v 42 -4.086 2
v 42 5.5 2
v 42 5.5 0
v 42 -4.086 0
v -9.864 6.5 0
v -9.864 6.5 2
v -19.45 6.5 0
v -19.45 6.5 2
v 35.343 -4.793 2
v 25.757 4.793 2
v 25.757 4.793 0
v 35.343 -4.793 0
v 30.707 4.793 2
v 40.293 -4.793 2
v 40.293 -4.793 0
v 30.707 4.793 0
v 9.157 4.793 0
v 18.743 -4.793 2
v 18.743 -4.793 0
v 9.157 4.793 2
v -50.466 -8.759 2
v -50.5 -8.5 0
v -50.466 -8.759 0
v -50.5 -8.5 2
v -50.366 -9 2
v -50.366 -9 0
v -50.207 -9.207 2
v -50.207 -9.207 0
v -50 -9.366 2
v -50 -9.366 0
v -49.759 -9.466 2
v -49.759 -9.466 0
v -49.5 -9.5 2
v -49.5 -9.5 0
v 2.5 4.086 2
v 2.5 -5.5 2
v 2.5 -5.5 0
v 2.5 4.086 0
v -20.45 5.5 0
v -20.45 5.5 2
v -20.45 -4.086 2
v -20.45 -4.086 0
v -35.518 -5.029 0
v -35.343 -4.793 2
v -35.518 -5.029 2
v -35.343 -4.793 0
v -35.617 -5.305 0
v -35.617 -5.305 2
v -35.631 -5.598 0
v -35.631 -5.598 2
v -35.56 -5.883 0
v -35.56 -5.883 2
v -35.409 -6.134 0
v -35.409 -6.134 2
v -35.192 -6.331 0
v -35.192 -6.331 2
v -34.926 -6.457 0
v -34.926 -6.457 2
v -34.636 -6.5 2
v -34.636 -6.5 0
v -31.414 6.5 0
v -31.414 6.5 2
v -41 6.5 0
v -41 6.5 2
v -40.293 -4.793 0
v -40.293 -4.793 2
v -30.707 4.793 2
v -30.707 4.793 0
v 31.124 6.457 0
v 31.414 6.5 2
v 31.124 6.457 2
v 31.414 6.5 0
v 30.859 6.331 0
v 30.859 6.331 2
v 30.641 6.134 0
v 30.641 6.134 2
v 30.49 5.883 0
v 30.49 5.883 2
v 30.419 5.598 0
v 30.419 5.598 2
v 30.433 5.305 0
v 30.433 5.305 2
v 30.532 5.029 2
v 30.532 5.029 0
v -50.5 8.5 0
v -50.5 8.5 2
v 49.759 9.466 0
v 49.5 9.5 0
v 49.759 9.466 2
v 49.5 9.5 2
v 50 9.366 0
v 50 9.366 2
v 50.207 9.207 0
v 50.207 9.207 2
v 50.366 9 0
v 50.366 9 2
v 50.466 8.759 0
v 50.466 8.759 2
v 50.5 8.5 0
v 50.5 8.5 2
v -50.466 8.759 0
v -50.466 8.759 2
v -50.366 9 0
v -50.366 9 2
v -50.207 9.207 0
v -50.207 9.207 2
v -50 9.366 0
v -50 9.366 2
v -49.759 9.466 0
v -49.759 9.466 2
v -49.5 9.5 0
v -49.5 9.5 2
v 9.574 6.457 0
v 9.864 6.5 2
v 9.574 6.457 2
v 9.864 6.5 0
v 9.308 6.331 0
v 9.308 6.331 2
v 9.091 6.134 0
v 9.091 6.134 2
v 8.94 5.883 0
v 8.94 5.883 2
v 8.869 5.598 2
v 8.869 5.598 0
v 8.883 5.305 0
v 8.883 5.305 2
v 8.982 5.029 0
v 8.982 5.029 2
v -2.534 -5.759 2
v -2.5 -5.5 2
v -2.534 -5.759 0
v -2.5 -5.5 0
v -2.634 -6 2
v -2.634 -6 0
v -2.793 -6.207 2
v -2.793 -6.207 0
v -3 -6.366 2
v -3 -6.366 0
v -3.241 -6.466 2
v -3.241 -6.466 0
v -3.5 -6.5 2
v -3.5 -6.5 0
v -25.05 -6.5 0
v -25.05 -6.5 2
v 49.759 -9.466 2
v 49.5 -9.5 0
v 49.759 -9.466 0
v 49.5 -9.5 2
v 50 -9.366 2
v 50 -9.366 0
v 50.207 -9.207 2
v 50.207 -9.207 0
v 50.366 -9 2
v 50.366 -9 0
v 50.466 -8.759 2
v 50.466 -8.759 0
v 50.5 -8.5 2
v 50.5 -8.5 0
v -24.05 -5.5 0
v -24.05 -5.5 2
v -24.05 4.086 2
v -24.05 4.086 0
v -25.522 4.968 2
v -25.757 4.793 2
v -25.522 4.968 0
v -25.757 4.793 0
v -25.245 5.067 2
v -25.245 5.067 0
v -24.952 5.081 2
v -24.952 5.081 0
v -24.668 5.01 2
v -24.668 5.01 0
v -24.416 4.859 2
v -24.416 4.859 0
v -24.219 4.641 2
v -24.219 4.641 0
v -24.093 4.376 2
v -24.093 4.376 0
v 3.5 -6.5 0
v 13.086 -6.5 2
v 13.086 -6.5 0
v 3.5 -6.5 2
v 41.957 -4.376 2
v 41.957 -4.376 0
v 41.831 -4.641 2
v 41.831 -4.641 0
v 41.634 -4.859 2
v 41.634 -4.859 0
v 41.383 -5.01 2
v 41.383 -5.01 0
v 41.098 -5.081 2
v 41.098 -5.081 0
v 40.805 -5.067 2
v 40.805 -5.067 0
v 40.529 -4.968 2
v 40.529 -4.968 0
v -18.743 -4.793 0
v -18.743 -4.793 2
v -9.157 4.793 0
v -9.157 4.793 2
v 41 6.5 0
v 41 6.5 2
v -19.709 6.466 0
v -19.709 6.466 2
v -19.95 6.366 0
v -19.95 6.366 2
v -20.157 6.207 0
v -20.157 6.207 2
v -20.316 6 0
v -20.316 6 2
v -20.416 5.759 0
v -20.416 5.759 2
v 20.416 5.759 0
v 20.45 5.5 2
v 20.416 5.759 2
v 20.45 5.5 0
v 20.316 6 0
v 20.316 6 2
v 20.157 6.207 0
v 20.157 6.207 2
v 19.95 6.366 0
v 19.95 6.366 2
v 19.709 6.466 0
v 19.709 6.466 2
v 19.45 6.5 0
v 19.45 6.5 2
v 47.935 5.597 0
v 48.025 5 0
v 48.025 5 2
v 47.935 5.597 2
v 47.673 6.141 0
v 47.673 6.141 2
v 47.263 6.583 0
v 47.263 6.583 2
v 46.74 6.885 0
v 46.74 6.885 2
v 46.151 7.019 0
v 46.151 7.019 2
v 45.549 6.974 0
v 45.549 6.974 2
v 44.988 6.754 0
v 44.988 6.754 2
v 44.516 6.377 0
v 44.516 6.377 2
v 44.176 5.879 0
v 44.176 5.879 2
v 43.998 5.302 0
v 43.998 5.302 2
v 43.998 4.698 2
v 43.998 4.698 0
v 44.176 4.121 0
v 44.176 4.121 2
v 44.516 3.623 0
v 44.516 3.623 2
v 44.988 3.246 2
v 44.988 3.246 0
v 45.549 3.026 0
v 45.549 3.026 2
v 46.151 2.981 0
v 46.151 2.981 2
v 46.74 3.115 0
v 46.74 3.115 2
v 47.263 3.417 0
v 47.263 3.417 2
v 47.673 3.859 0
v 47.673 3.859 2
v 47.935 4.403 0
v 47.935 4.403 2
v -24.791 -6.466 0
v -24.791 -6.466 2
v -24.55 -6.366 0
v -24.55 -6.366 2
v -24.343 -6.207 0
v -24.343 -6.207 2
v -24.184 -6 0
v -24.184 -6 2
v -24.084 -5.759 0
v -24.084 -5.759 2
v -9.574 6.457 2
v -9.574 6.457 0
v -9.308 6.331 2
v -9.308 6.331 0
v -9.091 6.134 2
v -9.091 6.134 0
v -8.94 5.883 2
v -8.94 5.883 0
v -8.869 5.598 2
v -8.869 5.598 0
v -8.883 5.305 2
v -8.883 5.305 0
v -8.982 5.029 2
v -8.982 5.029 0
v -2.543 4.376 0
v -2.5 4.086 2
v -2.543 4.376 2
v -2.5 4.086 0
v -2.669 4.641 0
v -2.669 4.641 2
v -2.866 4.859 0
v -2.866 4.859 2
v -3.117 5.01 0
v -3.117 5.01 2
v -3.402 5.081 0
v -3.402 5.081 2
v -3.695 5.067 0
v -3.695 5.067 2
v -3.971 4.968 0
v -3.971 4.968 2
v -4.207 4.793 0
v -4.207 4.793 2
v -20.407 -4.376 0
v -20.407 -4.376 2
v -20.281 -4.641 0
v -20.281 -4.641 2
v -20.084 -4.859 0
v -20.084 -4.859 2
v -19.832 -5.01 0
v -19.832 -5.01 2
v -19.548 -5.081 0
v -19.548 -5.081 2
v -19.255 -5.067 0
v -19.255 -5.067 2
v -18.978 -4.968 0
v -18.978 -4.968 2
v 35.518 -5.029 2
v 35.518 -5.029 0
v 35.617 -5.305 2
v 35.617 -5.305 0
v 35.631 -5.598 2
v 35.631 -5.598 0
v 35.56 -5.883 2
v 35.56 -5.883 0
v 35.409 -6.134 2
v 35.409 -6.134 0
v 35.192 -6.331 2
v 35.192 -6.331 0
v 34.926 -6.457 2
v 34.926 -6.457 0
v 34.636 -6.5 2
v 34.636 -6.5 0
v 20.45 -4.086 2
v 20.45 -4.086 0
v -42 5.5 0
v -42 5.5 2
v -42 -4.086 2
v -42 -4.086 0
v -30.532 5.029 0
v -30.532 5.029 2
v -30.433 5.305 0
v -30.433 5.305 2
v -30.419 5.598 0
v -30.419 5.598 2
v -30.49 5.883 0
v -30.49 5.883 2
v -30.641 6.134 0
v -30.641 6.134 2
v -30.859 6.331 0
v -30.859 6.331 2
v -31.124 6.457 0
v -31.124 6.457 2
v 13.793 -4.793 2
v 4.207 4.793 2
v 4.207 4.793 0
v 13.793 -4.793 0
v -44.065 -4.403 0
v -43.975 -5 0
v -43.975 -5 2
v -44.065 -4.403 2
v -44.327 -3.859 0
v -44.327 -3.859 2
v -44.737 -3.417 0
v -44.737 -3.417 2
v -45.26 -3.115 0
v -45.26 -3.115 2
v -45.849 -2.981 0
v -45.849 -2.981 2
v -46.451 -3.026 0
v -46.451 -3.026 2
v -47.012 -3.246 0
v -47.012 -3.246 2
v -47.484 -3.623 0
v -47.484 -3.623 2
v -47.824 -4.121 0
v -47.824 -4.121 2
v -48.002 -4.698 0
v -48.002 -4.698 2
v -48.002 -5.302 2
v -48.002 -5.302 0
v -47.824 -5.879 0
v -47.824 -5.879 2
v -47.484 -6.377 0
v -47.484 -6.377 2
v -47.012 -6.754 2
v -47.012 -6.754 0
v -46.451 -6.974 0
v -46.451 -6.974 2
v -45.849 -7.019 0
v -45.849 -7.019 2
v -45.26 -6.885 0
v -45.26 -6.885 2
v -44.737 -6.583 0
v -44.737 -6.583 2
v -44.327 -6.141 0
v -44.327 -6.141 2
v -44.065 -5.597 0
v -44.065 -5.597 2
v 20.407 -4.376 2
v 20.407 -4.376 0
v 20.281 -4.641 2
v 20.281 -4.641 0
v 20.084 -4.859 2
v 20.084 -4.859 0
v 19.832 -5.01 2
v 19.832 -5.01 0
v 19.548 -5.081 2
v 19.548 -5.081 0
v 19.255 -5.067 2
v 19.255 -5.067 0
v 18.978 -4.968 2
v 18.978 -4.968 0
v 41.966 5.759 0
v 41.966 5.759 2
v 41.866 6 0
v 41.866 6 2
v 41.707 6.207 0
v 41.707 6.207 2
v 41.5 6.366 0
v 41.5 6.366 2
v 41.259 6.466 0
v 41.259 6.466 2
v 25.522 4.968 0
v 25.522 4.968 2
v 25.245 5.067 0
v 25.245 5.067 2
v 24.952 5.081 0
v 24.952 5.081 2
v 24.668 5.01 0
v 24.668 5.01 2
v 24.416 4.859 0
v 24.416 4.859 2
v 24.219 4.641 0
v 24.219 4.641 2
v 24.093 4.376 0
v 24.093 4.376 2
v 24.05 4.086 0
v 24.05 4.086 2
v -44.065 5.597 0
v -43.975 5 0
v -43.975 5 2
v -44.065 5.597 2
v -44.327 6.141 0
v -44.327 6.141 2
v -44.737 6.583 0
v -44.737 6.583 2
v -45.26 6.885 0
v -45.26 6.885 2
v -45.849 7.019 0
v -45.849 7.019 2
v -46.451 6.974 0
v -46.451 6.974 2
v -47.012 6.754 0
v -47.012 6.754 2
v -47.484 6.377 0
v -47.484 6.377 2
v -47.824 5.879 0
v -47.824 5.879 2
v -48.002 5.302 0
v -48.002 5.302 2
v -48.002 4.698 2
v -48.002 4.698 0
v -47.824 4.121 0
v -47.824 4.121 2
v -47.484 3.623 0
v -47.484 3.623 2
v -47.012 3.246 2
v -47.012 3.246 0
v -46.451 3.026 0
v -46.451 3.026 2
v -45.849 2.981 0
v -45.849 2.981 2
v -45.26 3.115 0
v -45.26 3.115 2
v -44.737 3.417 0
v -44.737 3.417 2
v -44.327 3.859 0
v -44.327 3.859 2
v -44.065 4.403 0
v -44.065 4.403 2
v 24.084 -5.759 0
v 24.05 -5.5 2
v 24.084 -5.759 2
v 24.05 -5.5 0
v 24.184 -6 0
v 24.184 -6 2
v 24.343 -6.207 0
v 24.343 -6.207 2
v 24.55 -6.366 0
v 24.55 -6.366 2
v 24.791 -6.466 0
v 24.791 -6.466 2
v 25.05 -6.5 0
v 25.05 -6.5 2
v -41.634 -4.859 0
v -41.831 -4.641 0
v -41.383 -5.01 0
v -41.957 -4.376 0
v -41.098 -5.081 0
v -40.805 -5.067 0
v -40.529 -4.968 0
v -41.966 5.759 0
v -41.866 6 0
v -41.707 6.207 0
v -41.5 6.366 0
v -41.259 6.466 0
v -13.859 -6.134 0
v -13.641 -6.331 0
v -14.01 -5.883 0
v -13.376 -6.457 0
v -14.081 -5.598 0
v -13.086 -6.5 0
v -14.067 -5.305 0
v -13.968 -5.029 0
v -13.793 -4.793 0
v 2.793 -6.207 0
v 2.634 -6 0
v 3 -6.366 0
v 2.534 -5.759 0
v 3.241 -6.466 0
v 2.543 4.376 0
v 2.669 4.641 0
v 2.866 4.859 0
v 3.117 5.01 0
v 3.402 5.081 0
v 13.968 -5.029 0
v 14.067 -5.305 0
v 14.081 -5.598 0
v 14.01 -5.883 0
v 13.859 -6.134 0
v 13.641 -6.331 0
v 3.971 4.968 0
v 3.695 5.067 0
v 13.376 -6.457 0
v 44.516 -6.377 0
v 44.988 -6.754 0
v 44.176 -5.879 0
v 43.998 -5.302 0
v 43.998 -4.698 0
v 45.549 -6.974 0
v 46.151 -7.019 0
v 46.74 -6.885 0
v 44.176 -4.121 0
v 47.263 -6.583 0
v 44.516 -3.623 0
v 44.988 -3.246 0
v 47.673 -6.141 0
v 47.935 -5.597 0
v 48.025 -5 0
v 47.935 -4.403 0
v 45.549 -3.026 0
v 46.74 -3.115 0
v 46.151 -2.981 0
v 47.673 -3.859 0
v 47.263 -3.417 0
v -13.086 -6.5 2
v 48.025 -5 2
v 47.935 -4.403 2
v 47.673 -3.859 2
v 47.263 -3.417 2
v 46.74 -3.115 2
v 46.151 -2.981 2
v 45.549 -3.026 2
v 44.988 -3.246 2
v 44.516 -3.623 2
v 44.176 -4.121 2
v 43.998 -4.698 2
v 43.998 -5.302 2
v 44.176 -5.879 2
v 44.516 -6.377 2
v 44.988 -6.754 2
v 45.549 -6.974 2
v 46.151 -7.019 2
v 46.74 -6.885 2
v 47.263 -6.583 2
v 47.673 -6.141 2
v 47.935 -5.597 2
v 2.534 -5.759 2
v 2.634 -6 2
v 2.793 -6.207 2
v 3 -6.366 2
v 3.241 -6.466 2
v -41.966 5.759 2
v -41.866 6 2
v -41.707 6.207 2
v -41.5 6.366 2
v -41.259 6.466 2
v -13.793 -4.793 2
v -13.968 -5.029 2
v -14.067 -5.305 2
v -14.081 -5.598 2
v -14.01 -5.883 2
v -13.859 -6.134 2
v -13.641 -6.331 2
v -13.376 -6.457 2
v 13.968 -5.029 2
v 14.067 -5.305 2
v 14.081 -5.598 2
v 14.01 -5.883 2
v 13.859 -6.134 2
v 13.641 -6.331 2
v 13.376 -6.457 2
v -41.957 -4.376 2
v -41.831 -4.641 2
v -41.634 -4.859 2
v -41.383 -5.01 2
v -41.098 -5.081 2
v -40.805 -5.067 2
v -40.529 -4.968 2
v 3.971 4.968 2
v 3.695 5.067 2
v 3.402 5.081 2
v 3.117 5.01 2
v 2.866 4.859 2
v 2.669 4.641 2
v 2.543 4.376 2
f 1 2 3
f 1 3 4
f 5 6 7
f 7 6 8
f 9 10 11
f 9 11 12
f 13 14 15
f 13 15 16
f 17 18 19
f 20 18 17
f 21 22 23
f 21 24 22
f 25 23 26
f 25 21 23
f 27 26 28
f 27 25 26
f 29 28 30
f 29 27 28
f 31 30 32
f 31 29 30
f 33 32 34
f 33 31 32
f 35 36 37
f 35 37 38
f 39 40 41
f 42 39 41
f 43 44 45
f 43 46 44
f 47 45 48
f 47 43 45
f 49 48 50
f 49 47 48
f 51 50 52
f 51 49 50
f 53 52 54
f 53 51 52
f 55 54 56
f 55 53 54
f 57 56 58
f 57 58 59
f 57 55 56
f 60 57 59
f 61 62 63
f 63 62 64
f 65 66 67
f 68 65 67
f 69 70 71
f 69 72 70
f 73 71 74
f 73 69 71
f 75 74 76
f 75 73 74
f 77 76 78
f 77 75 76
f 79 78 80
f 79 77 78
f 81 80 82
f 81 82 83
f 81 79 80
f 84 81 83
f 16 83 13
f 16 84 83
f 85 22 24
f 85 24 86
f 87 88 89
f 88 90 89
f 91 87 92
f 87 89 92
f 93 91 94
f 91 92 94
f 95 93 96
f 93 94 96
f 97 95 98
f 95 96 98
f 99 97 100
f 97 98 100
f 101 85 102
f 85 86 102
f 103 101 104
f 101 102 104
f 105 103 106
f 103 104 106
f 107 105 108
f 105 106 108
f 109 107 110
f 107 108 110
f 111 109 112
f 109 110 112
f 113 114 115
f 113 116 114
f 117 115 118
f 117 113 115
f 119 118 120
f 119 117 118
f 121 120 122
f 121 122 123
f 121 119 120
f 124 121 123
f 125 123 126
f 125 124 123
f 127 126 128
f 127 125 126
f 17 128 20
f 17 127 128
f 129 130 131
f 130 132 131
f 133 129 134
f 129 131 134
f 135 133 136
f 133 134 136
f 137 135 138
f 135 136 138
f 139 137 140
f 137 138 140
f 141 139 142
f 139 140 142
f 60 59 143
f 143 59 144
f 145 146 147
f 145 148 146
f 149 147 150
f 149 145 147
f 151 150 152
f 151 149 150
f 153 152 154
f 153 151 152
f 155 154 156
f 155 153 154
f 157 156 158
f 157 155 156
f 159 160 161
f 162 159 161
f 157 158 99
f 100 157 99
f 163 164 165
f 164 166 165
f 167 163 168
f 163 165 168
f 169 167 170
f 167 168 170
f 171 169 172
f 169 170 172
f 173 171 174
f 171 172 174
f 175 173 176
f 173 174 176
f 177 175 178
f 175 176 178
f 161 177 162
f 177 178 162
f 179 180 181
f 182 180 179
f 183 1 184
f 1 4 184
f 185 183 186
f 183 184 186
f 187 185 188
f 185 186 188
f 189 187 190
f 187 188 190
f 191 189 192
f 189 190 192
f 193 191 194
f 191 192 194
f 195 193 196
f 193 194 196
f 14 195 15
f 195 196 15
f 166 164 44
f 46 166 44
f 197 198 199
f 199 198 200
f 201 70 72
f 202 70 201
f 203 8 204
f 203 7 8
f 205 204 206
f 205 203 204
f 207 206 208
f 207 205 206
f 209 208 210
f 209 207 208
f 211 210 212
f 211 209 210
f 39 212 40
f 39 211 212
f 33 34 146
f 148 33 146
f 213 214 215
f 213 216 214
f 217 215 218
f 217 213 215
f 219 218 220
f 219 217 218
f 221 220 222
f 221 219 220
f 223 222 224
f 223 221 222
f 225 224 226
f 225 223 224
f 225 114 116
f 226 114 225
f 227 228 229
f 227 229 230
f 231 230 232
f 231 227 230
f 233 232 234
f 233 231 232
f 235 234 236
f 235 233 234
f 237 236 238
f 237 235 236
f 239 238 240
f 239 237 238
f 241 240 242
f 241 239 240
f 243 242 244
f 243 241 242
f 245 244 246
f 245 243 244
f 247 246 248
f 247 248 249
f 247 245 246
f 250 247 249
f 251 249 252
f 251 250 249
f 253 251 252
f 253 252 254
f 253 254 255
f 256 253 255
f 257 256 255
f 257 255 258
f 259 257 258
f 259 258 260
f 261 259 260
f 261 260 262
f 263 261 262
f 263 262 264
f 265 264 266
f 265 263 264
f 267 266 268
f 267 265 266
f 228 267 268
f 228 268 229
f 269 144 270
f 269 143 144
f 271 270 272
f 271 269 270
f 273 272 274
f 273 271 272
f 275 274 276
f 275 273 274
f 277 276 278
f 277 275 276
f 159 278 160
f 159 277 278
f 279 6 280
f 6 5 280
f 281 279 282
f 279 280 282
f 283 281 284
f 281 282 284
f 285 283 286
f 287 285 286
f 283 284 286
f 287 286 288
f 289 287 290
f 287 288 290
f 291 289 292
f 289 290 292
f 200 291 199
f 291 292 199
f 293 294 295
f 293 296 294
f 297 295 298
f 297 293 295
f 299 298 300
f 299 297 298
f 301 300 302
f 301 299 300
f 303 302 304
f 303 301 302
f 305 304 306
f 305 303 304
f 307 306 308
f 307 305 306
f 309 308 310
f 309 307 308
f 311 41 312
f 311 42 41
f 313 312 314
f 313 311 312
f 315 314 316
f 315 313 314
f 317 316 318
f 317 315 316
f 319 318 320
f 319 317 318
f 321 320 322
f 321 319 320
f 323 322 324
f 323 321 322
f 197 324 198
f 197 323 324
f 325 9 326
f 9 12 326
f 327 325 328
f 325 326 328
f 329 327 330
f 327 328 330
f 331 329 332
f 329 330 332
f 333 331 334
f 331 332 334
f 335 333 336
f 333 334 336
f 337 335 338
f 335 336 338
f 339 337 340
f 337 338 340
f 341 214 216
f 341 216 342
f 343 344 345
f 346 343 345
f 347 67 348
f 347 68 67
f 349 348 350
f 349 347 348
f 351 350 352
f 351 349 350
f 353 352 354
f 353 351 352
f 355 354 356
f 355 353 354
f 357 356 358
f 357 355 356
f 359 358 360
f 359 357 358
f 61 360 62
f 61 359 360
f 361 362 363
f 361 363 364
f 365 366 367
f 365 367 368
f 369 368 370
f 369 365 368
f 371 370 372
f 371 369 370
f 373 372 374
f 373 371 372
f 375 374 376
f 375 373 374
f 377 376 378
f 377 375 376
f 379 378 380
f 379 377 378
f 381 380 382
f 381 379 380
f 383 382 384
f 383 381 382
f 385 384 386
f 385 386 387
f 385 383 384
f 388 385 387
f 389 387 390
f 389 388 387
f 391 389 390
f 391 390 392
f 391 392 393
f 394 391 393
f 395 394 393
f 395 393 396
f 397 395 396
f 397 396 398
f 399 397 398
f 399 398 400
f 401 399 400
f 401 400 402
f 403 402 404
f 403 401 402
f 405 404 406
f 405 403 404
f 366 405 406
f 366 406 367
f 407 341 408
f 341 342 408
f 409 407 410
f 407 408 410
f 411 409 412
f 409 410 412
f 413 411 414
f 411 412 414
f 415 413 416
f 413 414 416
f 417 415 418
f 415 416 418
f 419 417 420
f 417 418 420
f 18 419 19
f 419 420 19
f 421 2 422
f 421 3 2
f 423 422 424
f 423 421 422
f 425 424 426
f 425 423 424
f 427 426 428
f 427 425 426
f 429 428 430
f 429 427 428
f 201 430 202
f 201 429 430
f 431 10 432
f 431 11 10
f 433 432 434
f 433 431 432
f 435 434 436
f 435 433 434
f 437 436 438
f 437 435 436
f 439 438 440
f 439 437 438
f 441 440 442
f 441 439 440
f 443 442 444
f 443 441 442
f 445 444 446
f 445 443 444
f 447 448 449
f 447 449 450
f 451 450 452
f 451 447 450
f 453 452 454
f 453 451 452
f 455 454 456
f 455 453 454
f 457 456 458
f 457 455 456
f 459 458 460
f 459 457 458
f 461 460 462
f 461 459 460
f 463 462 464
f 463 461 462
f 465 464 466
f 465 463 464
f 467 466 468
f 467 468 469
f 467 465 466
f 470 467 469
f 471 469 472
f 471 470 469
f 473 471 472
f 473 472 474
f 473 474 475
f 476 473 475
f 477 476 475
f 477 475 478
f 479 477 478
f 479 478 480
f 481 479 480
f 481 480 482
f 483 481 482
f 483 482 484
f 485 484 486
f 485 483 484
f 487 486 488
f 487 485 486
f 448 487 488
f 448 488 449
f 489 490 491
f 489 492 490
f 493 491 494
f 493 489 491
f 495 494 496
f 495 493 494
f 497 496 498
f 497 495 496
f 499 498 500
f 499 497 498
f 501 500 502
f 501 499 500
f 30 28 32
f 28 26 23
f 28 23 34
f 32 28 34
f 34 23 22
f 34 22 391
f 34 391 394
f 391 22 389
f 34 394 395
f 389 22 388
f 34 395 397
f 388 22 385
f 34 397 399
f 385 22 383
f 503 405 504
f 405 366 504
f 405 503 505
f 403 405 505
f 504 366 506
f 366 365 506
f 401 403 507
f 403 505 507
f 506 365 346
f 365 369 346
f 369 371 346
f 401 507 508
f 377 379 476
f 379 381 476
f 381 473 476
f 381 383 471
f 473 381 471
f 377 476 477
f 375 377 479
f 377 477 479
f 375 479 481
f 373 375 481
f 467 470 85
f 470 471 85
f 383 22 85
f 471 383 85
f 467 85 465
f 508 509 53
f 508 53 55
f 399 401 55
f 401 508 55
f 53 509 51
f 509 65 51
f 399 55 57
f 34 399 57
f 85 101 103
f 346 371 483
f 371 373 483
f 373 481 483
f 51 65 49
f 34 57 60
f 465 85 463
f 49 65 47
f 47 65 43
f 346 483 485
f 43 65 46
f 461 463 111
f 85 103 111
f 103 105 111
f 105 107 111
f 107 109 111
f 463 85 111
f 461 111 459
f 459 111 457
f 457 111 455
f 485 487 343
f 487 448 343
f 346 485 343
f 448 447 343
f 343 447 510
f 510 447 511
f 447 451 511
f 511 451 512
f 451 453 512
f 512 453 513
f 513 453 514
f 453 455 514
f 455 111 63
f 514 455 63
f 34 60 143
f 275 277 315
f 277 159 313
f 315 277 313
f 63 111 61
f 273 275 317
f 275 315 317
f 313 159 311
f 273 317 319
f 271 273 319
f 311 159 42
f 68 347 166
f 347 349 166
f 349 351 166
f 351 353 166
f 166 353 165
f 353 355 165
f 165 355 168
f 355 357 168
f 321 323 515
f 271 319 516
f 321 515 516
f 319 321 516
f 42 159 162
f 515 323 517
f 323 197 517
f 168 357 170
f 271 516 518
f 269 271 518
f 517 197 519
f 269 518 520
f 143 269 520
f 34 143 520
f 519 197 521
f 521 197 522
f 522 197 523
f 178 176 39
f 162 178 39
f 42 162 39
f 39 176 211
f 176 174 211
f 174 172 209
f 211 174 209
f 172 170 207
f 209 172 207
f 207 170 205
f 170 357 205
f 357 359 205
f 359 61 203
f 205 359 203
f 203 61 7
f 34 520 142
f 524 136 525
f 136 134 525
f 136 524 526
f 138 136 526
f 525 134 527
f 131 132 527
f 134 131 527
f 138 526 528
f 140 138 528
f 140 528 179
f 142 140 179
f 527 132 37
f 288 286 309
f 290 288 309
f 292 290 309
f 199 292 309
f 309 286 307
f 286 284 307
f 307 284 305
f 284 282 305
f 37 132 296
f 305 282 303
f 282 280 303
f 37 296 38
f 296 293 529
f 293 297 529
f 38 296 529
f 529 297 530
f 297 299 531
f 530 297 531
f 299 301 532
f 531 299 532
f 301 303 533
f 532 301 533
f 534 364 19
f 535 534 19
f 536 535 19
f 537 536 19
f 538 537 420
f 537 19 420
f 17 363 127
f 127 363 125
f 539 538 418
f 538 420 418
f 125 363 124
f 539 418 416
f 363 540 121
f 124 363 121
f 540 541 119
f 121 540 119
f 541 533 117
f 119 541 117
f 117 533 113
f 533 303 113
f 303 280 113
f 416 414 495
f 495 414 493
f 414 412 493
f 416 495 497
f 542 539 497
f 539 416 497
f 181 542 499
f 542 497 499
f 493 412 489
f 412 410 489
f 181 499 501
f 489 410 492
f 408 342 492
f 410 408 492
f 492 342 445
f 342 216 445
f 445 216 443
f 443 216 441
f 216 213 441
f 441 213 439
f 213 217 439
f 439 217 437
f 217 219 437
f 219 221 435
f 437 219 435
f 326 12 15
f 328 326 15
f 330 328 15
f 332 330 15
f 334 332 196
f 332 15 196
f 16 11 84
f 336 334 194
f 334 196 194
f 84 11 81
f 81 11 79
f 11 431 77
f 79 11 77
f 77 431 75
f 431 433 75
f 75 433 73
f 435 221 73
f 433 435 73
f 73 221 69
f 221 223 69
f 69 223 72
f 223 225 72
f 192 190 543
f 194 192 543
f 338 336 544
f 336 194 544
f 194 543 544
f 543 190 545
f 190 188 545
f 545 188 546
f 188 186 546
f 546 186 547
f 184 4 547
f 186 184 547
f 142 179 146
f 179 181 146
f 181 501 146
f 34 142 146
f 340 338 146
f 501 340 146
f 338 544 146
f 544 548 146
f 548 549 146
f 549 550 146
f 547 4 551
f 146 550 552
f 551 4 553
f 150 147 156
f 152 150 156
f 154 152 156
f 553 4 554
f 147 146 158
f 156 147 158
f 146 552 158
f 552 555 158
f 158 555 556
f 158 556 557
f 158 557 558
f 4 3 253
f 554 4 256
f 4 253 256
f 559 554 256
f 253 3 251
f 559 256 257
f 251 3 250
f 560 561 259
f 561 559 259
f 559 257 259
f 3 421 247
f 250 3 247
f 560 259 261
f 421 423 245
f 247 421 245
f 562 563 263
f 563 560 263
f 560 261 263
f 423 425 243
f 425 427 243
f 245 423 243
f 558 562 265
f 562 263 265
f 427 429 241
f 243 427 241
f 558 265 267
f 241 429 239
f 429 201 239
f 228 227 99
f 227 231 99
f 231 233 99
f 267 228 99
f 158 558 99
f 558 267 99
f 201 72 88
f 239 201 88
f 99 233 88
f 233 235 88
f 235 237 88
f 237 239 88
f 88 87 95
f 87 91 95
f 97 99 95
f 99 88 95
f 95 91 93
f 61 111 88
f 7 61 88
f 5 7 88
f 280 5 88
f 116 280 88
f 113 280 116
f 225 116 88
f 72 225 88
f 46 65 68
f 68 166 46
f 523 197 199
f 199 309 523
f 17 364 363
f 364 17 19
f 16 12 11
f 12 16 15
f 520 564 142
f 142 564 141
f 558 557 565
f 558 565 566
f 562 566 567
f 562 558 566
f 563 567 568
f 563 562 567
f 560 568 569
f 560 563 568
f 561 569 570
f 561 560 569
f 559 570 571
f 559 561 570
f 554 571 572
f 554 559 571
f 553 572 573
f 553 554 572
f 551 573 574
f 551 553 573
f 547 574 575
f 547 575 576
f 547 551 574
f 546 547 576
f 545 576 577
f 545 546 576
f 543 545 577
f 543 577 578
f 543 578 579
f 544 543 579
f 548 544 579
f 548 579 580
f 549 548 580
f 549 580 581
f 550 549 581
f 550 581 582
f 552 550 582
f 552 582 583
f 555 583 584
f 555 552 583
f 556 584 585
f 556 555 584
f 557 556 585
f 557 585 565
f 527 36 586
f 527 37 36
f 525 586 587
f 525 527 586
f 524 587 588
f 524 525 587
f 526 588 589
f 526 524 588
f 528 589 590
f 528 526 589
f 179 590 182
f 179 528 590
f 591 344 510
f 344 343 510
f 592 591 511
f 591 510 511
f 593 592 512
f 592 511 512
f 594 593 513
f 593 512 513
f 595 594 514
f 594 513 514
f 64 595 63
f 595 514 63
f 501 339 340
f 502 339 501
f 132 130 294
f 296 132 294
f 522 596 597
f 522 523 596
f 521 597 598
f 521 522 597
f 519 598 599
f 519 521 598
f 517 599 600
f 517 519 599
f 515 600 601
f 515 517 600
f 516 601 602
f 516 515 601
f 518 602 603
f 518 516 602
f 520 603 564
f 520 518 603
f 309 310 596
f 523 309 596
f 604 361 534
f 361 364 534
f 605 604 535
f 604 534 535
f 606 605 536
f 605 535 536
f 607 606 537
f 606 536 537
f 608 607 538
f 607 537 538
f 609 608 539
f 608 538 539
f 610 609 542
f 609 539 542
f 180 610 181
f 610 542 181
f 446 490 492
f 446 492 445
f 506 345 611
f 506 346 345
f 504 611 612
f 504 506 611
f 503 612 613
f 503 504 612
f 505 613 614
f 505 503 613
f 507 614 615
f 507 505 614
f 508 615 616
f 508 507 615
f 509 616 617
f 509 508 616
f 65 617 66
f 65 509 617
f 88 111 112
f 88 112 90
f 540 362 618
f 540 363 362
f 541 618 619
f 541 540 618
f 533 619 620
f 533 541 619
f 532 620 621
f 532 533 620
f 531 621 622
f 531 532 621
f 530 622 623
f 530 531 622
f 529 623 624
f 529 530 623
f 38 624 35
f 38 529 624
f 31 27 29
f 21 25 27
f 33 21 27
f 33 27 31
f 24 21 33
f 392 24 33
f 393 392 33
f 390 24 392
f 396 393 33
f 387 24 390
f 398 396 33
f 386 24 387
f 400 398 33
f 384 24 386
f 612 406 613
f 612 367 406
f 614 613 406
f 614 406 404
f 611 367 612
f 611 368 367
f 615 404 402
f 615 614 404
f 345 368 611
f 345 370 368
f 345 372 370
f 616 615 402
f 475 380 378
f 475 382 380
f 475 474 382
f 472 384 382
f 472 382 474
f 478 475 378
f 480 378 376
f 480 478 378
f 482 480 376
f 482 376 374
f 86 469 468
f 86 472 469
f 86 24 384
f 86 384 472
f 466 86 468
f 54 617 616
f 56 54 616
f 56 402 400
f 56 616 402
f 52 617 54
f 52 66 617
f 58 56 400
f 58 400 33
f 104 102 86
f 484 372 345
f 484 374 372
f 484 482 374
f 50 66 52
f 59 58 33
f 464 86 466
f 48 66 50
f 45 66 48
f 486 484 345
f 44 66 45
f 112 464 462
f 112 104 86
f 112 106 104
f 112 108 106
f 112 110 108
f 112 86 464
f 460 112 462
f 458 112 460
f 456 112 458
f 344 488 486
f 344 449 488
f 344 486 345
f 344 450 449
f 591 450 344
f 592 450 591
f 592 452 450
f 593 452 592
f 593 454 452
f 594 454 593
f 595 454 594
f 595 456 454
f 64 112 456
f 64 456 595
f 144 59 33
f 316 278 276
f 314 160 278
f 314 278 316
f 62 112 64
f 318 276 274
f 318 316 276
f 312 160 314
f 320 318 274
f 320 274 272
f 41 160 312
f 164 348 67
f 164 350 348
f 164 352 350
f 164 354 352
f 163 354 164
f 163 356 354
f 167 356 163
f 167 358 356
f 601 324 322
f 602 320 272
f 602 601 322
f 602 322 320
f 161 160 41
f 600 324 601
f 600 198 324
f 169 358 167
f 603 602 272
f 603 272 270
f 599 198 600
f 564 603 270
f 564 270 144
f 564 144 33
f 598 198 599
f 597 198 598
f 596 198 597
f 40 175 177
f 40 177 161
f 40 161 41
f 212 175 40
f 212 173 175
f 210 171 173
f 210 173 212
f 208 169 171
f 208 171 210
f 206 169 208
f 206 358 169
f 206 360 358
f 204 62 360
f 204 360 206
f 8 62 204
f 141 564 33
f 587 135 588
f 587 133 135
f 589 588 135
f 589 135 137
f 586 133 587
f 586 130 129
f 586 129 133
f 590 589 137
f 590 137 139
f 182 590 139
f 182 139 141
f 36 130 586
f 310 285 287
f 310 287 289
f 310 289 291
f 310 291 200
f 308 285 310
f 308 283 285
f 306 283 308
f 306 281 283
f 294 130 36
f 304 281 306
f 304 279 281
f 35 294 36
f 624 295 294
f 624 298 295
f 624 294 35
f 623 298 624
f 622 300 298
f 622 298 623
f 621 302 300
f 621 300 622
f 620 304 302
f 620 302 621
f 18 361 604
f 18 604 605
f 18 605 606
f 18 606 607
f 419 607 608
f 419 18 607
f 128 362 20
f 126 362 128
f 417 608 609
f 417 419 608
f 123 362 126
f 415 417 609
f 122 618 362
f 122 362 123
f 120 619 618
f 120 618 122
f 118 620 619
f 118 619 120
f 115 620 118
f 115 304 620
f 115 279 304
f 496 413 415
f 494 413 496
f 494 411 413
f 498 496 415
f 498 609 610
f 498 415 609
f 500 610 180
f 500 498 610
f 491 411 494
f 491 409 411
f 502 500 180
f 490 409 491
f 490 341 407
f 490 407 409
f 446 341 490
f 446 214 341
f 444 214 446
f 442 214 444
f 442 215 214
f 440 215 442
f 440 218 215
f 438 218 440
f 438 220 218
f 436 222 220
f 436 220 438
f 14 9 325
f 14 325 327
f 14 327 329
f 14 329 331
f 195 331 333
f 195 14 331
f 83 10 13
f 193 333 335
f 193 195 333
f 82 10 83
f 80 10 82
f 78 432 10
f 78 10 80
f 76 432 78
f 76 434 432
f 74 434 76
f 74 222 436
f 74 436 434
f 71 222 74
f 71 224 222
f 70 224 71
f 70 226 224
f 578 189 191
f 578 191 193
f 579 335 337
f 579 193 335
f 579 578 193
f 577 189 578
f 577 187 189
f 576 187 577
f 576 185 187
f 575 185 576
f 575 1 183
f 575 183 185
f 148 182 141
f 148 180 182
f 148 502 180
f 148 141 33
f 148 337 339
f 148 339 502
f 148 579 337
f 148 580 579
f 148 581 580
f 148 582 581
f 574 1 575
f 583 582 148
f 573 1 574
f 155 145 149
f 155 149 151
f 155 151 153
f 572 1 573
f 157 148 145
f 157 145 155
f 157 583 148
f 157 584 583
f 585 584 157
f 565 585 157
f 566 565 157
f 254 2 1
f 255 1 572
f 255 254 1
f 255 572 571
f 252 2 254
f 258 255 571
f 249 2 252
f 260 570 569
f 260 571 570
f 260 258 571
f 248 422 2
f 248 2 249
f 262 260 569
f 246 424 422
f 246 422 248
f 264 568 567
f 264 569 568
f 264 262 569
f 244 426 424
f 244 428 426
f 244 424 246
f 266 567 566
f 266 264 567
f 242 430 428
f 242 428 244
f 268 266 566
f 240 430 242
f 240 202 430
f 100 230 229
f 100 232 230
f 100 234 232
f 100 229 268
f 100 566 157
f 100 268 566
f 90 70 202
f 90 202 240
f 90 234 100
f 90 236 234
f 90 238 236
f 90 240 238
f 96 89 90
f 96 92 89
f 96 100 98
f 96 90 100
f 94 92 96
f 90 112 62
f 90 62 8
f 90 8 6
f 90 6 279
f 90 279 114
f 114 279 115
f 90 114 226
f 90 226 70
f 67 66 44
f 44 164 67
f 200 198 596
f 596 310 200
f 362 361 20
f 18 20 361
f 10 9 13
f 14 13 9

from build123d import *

# Parameters (mm, degrees)
SKETCH_1_W          = 101
SKETCH_1_H          = 19
SKETCH_1_R          = 2.025
EXTRUDE_1_DEPTH     = 2
CUT_EXTRUDE_1_DEPTH = 2
FILLET_1_R          = 1
FILLET_2_R          = 1


with BuildPart() as part:
    # 草图1 → 凸台-拉伸1 (new body)
    with BuildSketch(Plane.XY):
        Rectangle(SKETCH_1_W, SKETCH_1_H)
        with Locations((-46, 5)):
            Circle(SKETCH_1_R, mode=Mode.SUBTRACT)
        with Locations((46, 5)):
            Circle(SKETCH_1_R, mode=Mode.SUBTRACT)
        with Locations((46, -5)):
            Circle(SKETCH_1_R, mode=Mode.SUBTRACT)
        with Locations((-46, -5)):
            Circle(SKETCH_1_R, mode=Mode.SUBTRACT)
    extrude(amount=EXTRUDE_1_DEPTH)

    # 草图2 → 切除-拉伸1 (cut)
    with BuildSketch(Plane.XY.offset(2)):
        Polygon((-42, 6.5), (-42, -6.5), (-29, 6.5), align=None)
        Polygon((-24.050252532, 6.5), (-37.050252532, -6.5), (-24.050252532, -6.5), align=None)
        Polygon((-2.5, -6.5), (-2.5, 6.5), (-15.5, -6.5), align=None)
        Polygon((-7.449747468, 6.5), (-20.449747468, 6.5), (-20.449747468, -6.5), align=None)
        Polygon((42, -6.5), (29, 6.5), (42, 6.5), align=None)
        Polygon((37.050252532, -6.5), (24.050252532, -6.5), (24.050252532, 6.5), align=None)
        Polygon((20.449747468, -6.5), (7.449747468, 6.5), (20.449747468, 6.5), align=None)
        Polygon((15.5, -6.5), (2.5, -6.5), (2.5, 6.5), align=None)
    extrude(amount=-CUT_EXTRUDE_1_DEPTH, mode=Mode.SUBTRACT)

    # 圆角1
    fillet_1_edges = [part.edges().sort_by_distance(p)[0] for p in [
        (-20.449747468, -6.5, 1),
        (-20.449747468, 6.5, 1),
        (-7.449747468, 6.5, 1),
        (-15.5, -6.5, 1),
        (-2.5, 6.5, 1),
        (-2.5, -6.5, 1),
        (42, 6.5, 1),
        (42, -6.5, 1),
        (29, 6.5, 1),
        (-24.050252532, 6.5, 1),
        (-24.050252532, -6.5, 1),
        (-37.050252532, -6.5, 1),
        (2.5, 6.5, 1),
        (15.5, -6.5, 1),
        (2.5, -6.5, 1),
        (20.449747468, 6.5, 1),
        (20.449747468, -6.5, 1),
        (7.449747468, 6.5, 1),
        (24.050252532, 6.5, 1),
        (37.050252532, -6.5, 1),
        (24.050252532, -6.5, 1),
        (-42, 6.5, 1),
        (-29, 6.5, 1),
        (-42, -6.5, 1),
    ]]
    fillet(fillet_1_edges, radius=FILLET_1_R)

    # 圆角2
    fillet_2_edges = [part.edges().sort_by_distance(p)[0] for p in [
        (-50.5, 9.5, 1),
        (50.5, 9.5, 1),
        (50.5, -9.5, 1),
        (-50.5, -9.5, 1),
    ]]
    fillet(fillet_2_edges, radius=FILLET_2_R)


solid = part.part
